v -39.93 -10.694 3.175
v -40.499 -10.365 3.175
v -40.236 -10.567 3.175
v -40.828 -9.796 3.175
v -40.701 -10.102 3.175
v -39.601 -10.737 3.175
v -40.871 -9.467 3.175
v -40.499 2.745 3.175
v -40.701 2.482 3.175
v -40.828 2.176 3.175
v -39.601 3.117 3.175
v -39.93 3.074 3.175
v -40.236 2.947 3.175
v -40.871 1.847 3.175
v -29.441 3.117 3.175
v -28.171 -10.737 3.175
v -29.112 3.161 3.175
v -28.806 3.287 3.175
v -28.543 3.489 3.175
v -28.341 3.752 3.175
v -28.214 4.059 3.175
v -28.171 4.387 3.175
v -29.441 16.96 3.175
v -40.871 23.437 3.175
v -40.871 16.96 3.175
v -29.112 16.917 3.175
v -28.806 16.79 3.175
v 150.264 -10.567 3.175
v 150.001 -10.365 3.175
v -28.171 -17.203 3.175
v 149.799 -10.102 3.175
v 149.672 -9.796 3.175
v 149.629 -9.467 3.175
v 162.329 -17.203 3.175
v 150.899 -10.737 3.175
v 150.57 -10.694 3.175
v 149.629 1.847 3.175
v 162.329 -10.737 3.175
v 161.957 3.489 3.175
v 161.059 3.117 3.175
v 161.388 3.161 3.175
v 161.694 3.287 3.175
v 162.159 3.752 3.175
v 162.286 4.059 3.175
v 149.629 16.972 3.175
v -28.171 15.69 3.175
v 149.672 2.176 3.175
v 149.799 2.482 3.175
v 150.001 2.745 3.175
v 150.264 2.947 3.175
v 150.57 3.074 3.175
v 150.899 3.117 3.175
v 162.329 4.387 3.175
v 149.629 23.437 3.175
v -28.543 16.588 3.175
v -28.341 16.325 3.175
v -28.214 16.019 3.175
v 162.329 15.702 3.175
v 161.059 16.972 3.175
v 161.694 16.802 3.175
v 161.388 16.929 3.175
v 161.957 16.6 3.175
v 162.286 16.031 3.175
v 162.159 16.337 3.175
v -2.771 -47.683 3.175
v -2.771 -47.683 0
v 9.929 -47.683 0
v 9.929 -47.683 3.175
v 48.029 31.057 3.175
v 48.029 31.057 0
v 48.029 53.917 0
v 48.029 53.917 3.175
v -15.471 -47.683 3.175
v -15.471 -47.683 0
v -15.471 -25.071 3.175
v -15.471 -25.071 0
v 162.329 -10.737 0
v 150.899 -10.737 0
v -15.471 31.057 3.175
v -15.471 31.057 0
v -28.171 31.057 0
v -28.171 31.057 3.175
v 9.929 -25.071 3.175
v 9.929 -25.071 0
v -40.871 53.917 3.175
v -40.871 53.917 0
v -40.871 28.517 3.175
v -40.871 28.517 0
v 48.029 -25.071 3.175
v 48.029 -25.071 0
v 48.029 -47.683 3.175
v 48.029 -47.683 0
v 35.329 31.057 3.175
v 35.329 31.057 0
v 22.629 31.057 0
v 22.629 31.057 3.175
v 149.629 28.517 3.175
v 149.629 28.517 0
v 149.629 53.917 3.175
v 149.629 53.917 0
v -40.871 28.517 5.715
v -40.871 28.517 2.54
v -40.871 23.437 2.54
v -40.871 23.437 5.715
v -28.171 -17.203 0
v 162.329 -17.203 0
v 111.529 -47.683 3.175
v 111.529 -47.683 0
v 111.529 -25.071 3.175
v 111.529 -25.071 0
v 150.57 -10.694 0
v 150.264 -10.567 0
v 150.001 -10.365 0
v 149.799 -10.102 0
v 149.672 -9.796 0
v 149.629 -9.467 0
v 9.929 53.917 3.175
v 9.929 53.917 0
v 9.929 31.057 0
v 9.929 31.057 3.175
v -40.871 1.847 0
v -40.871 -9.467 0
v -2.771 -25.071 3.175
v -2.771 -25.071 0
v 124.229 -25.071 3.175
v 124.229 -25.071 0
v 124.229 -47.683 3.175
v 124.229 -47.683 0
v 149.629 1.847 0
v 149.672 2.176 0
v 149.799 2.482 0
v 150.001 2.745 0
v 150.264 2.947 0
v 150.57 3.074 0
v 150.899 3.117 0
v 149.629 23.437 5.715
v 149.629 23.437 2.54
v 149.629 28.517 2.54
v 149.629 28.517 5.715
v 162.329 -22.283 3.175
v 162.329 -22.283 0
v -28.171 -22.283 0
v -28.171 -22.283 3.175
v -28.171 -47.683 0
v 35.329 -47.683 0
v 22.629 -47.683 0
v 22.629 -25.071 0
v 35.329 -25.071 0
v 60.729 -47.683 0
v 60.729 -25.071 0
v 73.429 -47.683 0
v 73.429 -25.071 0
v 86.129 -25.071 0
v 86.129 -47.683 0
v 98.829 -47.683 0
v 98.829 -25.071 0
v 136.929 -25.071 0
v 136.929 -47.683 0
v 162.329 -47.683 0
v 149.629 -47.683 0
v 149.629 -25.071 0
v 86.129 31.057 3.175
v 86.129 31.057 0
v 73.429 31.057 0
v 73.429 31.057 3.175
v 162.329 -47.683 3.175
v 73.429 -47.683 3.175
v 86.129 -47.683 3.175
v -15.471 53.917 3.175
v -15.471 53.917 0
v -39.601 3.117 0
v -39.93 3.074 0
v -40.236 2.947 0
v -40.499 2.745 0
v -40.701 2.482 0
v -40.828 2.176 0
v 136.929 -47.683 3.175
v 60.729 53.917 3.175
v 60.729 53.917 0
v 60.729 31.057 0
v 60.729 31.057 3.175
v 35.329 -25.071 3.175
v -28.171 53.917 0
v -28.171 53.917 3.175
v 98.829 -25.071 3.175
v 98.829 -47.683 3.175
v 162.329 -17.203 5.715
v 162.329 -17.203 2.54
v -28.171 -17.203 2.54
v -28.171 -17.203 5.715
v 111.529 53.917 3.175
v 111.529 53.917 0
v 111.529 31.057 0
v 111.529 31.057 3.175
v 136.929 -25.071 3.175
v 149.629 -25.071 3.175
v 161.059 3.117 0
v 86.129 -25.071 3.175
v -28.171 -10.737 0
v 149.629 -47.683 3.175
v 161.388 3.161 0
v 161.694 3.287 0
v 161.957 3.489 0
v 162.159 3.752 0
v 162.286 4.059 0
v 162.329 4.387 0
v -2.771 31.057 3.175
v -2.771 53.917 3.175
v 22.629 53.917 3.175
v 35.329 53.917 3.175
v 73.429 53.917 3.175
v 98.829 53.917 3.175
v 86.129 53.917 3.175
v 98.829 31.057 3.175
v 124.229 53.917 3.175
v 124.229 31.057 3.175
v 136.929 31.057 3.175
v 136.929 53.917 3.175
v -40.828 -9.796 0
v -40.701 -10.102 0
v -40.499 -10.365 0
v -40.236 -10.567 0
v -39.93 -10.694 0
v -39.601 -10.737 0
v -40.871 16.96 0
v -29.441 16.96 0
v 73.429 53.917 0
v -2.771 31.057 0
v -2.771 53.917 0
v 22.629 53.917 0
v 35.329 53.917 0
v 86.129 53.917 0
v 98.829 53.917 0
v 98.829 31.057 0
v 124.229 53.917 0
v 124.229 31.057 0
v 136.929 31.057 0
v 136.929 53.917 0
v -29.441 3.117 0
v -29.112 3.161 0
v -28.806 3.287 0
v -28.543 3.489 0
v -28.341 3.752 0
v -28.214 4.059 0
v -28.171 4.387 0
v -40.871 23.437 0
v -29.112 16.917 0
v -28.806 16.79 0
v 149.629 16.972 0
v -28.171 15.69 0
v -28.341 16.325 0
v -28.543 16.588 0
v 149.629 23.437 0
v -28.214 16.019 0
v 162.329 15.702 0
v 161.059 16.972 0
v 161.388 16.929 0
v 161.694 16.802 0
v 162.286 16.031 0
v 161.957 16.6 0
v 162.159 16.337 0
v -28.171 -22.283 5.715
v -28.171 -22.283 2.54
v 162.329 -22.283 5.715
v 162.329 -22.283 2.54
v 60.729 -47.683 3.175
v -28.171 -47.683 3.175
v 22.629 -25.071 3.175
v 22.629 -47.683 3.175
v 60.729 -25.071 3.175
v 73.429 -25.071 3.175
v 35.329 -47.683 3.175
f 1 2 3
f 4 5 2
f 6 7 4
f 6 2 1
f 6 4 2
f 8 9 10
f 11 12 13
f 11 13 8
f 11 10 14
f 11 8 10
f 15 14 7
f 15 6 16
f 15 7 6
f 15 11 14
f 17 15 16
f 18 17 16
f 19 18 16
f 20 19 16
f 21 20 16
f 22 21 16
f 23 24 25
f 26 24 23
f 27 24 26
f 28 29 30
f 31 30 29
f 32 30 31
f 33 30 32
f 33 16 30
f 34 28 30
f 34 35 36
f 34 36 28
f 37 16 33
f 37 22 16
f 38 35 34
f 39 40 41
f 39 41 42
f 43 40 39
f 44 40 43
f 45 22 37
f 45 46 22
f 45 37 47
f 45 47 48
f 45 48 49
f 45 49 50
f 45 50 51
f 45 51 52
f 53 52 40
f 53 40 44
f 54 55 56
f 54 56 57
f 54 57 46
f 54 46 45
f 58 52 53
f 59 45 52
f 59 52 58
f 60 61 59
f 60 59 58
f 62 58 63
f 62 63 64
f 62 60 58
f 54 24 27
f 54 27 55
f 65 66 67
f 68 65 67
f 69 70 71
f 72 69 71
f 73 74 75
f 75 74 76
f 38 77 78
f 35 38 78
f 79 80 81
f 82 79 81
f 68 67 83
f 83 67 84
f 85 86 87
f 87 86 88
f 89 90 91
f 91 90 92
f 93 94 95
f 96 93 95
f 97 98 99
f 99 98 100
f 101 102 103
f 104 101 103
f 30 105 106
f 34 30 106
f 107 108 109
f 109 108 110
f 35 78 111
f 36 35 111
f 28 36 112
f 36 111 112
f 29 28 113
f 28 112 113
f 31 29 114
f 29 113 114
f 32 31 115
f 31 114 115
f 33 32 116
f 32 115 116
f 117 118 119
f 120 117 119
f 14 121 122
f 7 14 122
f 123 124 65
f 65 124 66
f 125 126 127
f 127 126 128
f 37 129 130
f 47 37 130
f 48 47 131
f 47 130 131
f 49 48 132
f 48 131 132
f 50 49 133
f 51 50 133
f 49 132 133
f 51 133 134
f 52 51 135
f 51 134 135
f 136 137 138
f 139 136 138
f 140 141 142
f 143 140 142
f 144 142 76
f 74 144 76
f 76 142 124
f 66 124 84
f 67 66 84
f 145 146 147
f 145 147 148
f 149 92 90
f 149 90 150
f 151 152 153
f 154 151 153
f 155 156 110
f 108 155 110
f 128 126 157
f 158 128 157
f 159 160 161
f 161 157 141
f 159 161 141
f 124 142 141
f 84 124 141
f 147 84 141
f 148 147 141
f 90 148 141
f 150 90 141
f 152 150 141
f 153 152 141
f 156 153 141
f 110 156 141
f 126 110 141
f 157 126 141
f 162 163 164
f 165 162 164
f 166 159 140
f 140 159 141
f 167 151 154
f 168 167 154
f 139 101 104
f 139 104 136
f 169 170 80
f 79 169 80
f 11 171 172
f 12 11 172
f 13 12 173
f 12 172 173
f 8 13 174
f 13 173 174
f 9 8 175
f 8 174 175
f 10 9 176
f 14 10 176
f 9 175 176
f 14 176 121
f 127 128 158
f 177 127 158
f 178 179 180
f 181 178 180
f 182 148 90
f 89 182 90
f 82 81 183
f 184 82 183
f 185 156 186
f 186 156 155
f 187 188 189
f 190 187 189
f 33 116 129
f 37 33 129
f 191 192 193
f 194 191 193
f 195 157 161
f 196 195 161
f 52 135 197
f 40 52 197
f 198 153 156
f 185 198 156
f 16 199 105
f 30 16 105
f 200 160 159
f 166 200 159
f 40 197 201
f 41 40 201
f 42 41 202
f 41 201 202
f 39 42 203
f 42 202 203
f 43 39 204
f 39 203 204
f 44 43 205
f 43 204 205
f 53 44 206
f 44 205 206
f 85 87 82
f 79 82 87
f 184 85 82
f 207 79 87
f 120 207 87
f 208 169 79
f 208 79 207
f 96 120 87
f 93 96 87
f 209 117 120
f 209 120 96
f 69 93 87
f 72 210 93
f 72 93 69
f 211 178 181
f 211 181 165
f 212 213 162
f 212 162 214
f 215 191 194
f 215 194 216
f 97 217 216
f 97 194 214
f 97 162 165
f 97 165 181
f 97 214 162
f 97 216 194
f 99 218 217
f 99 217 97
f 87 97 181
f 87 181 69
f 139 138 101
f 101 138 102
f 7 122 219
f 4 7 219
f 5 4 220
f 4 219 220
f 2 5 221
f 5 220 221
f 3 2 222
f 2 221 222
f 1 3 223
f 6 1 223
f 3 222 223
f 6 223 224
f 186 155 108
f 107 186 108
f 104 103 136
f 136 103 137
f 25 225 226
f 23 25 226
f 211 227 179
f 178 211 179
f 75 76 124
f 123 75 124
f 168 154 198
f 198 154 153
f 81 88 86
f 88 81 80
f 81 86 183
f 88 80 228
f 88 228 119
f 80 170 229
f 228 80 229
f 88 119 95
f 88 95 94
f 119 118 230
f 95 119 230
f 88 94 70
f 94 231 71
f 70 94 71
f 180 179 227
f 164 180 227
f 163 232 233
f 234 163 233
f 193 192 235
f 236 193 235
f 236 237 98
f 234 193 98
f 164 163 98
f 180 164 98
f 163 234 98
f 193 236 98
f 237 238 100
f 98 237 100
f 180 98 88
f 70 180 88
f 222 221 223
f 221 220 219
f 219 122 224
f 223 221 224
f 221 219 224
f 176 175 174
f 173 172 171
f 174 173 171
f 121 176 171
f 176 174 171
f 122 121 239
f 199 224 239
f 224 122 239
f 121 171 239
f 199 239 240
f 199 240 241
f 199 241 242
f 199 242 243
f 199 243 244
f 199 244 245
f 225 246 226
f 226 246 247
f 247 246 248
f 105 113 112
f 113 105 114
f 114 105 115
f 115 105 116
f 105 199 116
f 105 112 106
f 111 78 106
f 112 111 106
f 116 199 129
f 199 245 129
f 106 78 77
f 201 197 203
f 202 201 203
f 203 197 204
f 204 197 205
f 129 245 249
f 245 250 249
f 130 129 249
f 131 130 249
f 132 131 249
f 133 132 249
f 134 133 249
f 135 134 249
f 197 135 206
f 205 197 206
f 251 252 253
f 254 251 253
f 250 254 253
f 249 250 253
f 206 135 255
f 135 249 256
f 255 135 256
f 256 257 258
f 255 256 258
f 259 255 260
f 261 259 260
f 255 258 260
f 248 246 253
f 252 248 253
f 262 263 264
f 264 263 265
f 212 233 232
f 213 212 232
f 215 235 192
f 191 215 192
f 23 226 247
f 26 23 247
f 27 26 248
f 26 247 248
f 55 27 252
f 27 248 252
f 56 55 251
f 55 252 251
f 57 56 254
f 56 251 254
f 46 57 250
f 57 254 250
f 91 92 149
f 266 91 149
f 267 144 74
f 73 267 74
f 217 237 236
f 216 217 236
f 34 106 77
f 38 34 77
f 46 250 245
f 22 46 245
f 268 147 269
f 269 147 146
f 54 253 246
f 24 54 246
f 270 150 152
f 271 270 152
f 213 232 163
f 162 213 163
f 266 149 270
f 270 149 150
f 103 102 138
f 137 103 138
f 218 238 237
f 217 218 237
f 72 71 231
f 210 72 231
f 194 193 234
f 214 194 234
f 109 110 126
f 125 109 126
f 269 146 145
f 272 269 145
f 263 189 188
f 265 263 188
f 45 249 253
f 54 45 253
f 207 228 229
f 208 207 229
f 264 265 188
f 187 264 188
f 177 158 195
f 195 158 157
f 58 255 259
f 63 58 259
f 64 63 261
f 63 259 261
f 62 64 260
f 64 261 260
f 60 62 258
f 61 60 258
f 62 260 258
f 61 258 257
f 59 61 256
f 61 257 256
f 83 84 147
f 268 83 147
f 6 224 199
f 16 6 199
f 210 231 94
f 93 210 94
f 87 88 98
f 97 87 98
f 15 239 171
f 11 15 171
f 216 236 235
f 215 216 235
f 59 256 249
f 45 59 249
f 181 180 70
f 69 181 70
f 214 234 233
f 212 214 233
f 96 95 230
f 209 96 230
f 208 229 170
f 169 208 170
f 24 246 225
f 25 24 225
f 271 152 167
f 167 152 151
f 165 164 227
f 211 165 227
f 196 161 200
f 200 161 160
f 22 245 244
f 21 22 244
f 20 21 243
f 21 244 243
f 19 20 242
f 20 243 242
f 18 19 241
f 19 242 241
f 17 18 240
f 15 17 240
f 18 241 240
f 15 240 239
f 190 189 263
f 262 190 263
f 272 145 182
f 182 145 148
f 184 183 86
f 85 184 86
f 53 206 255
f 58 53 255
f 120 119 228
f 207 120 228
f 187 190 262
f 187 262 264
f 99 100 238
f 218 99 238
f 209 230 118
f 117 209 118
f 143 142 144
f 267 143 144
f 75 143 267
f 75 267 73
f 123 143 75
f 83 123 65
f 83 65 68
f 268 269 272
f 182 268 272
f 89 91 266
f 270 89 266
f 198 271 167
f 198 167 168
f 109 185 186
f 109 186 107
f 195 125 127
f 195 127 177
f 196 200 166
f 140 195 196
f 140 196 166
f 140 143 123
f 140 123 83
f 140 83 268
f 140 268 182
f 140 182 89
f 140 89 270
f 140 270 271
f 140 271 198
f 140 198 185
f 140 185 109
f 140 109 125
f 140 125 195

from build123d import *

# Parameters (mm, degrees)
F1_DEPTH = 3.175
F2_DEPTH = 5.715
F3_DEPTH = 2.54


# Not quite as in the source:
# - ends of sketch curves that miss each other by under 0.0002 mm in the source are joined


with BuildPart() as f1:
    # F0 (on Top) → F1 (new body)
    with BuildSketch(Plane.XY):
        Polygon((-15.470907706, -22.2827270627), (-28.170907706, -22.2827270627), (-28.170907706, -25.0712689012), (-28.170907706, -47.6827270627), (-15.470907706, -47.6827270627), (-15.470907706, -25.0712689012), (-2.770907706, -25.0712689012), (-2.770907706, -47.6827270627), (9.929092294, -47.6827270627), (9.929092294, -25.0712689012), (22.629092294, -25.0712689012), (22.629092294, -47.6827270627), (35.329092294, -47.6827270627), (35.329092294, -25.0712689012), (48.029092294, -25.0712689012), (48.029092294, -47.6827270627), (60.7290890396, -47.6827270627), (60.7290890396, -25.0712689012), (73.429092294, -25.0712689012), (73.429092294, -47.6827270627), (86.129092294, -47.6827270627), (86.129092294, -25.0712689012), (98.829092294, -25.0712689012), (98.829092294, -47.6827270627), (111.529092294, -47.6827270627), (111.529092294, -25.0712689012), (124.229092294, -25.0712689012), (124.229092294, -47.6827270627), (136.929092294, -47.6827270627), (136.929092294, -25.0712689012), (149.629092294, -25.0712689012), (149.629092294, -47.6827270627), (162.329092294, -47.6827270627), (162.329092294, -22.2827270627), (149.629092294, -22.2827270627), (136.929092294, -22.2827270627), (124.229092294, -22.2827270627), (111.529092294, -22.2827270627), (98.829092294, -22.2827270627), (86.129092294, -22.2827270627), (73.429092294, -22.2827270627), (60.729092294, -22.2827270627), (48.029092294, -22.2827270627), (35.329092294, -22.2827270627), (22.629092294, -22.2827270627), (9.929092294, -22.2827270627), (-2.770907706, -22.2827270627), align=None)
    extrude(amount=F1_DEPTH)


with BuildPart() as f1b:
    # F0 (on Top) → F1, piece 2 (new body)
    with BuildSketch(Plane.XY):
        Polygon((-40.870907706, 31.0572729373), (-40.870907706, 28.5172729373), (-28.170907706, 28.5172729373), (-15.470907706, 28.5172729373), (-2.770907706, 28.5172729373), (9.929092294, 28.5172729373), (22.629092294, 28.5172729373), (35.329092294, 28.5172729373), (48.029092294, 28.5172729373), (60.729092294, 28.5172729373), (73.429092294, 28.5172729373), (86.129092294, 28.5172729373), (98.829092294, 28.5172729373), (111.529092294, 28.5172729373), (124.229092294, 28.5172729373), (136.929092294, 28.5172729373), (149.629092294, 28.5172729373), (149.629092294, 31.0572729373), (149.629092294, 53.9172729373), (136.929092294, 53.9172729373), (136.929092294, 31.0572729373), (124.229092294, 31.0572729373), (124.229092294, 53.9172729373), (111.529092294, 53.9172729373), (111.529092294, 31.0572729373), (98.829092294, 31.0572729373), (98.829092294, 53.9172729373), (86.129092294, 53.9172729373), (86.129092294, 31.0572729373), (73.429092294, 31.0572729373), (73.429092294, 53.9172729373), (60.729092294, 53.9172729373), (60.729092294, 31.0572729373), (48.029092294, 31.0572729373), (48.029092294, 53.9172729373), (35.329092294, 53.9172729373), (35.329092294, 31.0572729373), (22.629092294, 31.0572729373), (22.629092294, 53.9172729373), (9.929092294, 53.9172729373), (9.929092294, 31.0572729373), (-2.770907706, 31.0572729373), (-2.770907706, 53.9172729373), (-15.470907706, 53.9172729373), (-15.470907706, 31.0572729373), (-28.170907706, 31.0572729373), (-28.170907706, 53.9172729373), (-40.870907706, 53.9172729373), align=None)
    extrude(amount=F1_DEPTH)


with BuildPart() as f1c:
    # F0 (on Top) → F1, piece 3 (new body)
    with BuildSketch(Plane.XY):
        with BuildLine():
            Line((149.629092294, 23.4372729373), (-40.8709011972, 23.4372729373))
            Line((-40.8709011972, 23.4372729373), (-40.870907706, 16.9602729373))
            Line((-40.870907706, 16.9602729373), (-29.440907706, 16.9602729373))
            ThreePointArc((-29.440907706, 16.9602729373), (-28.5428820939, 16.5882985494), (-28.170907706, 15.6902729373))
            Line((-28.170907706, 15.6902729373), (-28.170907706, 4.3872729373))
            ThreePointArc((-28.170907706, 4.3872729373), (-28.5428820939, 3.4892473252), (-29.440907706, 3.1172729373))
            Line((-29.440907706, 3.1172729373), (-39.600907706, 3.1172729373))
            ThreePointArc((-39.600907706, 3.1172729373), (-40.4989333181, 2.7452985494), (-40.870907706, 1.8472729373))
            Line((-40.870907706, 1.8472729373), (-40.870907706, -9.4672727573))
            ThreePointArc((-40.870907706, -9.4672727573), (-40.4989333181, -10.3652983694), (-39.600907706, -10.7372727573))
            Line((-39.600907706, -10.7372727573), (-28.170907706, -10.7372727573))
            Line((-28.170907706, -10.7372727573), (-28.170907706, -17.2027270627))
            Line((-28.170907706, -17.2027270627), (162.3290857852, -17.2027270627))
            Line((162.3290857852, -17.2027270627), (162.329092294, -10.7372727573))
            Line((162.329092294, -10.7372727573), (150.899092294, -10.7372727573))
            ThreePointArc((150.899092294, -10.7372727573), (150.0010666819, -10.3652983694), (149.629092294, -9.4672727573))
            Line((149.629092294, -9.4672727573), (149.629092294, 1.8472729373))
            ThreePointArc((149.629092294, 1.8472729373), (150.0010666819, 2.7452985494), (150.899092294, 3.1172729373))
            Line((150.899092294, 3.1172729373), (161.059092294, 3.1172729373))
            ThreePointArc((161.059092294, 3.1172729373), (161.9571179061, 3.4892473252), (162.329092294, 4.3872729373))
            Line((162.329092294, 4.3872729373), (162.329092294, 15.7018186319))
            ThreePointArc((162.329092294, 15.7018186319), (161.9571179061, 16.599844244), (161.059092294, 16.9718186319))
            Line((161.059092294, 16.9718186319), (149.629092294, 16.9718186319))
            Line((149.629092294, 16.9718186319), (149.629092294, 23.4372729373))
        make_face()
    extrude(amount=F1_DEPTH)


with BuildPart() as f2:
    # F0 (on Top) → F2 (new body)
    with BuildSketch(Plane.XY):
        Polygon((-28.170907706, 28.5172729373), (-40.870907706, 28.5172729373), (-40.870907706, 23.4372729373), (149.629092294, 23.4372729373), (149.629092294, 28.5172729373), (136.929092294, 28.5172729373), (124.229092294, 28.5172729373), (111.529092294, 28.5172729373), (98.829092294, 28.5172729373), (86.129092294, 28.5172729373), (73.429092294, 28.5172729373), (60.729092294, 28.5172729373), (48.029092294, 28.5172729373), (35.329092294, 28.5172729373), (22.629092294, 28.5172729373), (9.929092294, 28.5172729373), (-2.770907706, 28.5172729373), (-15.470907706, 28.5172729373), align=None)
    extrude(amount=F2_DEPTH)


with BuildPart() as f2b:
    # F0 (on Top) → F2, piece 2 (new body)
    with BuildSketch(Plane.XY):
        Polygon((162.3290857852, -17.2027270627), (-28.170907706, -17.2027270627), (-28.170907706, -22.2827270627), (-15.470907706, -22.2827270627), (-2.770907706, -22.2827270627), (9.929092294, -22.2827270627), (22.629092294, -22.2827270627), (35.329092294, -22.2827270627), (48.029092294, -22.2827270627), (60.729092294, -22.2827270627), (73.429092294, -22.2827270627), (86.129092294, -22.2827270627), (98.829092294, -22.2827270627), (111.529092294, -22.2827270627), (124.229092294, -22.2827270627), (136.929092294, -22.2827270627), (149.629092294, -22.2827270627), (162.329092294, -22.2827270627), align=None)
    extrude(amount=F2_DEPTH)


with BuildPart() as f3_tool:
    # F0 (on Top) → F3 (new body)
    with BuildSketch(Plane.XY):
        Polygon((-28.170907706, 28.5172729373), (-40.870907706, 28.5172729373), (-40.870907706, 23.4372729373), (149.629092294, 23.4372729373), (149.629092294, 28.5172729373), (136.929092294, 28.5172729373), (124.229092294, 28.5172729373), (111.529092294, 28.5172729373), (98.829092294, 28.5172729373), (86.129092294, 28.5172729373), (73.429092294, 28.5172729373), (60.729092294, 28.5172729373), (48.029092294, 28.5172729373), (35.329092294, 28.5172729373), (22.629092294, 28.5172729373), (9.929092294, 28.5172729373), (-2.770907706, 28.5172729373), (-15.470907706, 28.5172729373), align=None)
        Polygon((162.3290857852, -17.2027270627), (-28.170907706, -17.2027270627), (-28.170907706, -22.2827270627), (-15.470907706, -22.2827270627), (-2.770907706, -22.2827270627), (9.929092294, -22.2827270627), (22.629092294, -22.2827270627), (35.329092294, -22.2827270627), (48.029092294, -22.2827270627), (60.729092294, -22.2827270627), (73.429092294, -22.2827270627), (86.129092294, -22.2827270627), (98.829092294, -22.2827270627), (111.529092294, -22.2827270627), (124.229092294, -22.2827270627), (136.929092294, -22.2827270627), (149.629092294, -22.2827270627), (162.329092294, -22.2827270627), align=None)
    extrude(amount=F3_DEPTH)


with BuildPart() as f2_1:
    add(f2.part)

    # F3: cut by f3_tool
    add(f3_tool.part, mode=Mode.SUBTRACT)


with BuildPart() as f2b_1:
    add(f2b.part)

    # F3: cut by f3_tool
    add(f3_tool.part, mode=Mode.SUBTRACT)


solid = Compound([f1.part, f1b.part, f1c.part, f2_1.part, f2b_1.part])
